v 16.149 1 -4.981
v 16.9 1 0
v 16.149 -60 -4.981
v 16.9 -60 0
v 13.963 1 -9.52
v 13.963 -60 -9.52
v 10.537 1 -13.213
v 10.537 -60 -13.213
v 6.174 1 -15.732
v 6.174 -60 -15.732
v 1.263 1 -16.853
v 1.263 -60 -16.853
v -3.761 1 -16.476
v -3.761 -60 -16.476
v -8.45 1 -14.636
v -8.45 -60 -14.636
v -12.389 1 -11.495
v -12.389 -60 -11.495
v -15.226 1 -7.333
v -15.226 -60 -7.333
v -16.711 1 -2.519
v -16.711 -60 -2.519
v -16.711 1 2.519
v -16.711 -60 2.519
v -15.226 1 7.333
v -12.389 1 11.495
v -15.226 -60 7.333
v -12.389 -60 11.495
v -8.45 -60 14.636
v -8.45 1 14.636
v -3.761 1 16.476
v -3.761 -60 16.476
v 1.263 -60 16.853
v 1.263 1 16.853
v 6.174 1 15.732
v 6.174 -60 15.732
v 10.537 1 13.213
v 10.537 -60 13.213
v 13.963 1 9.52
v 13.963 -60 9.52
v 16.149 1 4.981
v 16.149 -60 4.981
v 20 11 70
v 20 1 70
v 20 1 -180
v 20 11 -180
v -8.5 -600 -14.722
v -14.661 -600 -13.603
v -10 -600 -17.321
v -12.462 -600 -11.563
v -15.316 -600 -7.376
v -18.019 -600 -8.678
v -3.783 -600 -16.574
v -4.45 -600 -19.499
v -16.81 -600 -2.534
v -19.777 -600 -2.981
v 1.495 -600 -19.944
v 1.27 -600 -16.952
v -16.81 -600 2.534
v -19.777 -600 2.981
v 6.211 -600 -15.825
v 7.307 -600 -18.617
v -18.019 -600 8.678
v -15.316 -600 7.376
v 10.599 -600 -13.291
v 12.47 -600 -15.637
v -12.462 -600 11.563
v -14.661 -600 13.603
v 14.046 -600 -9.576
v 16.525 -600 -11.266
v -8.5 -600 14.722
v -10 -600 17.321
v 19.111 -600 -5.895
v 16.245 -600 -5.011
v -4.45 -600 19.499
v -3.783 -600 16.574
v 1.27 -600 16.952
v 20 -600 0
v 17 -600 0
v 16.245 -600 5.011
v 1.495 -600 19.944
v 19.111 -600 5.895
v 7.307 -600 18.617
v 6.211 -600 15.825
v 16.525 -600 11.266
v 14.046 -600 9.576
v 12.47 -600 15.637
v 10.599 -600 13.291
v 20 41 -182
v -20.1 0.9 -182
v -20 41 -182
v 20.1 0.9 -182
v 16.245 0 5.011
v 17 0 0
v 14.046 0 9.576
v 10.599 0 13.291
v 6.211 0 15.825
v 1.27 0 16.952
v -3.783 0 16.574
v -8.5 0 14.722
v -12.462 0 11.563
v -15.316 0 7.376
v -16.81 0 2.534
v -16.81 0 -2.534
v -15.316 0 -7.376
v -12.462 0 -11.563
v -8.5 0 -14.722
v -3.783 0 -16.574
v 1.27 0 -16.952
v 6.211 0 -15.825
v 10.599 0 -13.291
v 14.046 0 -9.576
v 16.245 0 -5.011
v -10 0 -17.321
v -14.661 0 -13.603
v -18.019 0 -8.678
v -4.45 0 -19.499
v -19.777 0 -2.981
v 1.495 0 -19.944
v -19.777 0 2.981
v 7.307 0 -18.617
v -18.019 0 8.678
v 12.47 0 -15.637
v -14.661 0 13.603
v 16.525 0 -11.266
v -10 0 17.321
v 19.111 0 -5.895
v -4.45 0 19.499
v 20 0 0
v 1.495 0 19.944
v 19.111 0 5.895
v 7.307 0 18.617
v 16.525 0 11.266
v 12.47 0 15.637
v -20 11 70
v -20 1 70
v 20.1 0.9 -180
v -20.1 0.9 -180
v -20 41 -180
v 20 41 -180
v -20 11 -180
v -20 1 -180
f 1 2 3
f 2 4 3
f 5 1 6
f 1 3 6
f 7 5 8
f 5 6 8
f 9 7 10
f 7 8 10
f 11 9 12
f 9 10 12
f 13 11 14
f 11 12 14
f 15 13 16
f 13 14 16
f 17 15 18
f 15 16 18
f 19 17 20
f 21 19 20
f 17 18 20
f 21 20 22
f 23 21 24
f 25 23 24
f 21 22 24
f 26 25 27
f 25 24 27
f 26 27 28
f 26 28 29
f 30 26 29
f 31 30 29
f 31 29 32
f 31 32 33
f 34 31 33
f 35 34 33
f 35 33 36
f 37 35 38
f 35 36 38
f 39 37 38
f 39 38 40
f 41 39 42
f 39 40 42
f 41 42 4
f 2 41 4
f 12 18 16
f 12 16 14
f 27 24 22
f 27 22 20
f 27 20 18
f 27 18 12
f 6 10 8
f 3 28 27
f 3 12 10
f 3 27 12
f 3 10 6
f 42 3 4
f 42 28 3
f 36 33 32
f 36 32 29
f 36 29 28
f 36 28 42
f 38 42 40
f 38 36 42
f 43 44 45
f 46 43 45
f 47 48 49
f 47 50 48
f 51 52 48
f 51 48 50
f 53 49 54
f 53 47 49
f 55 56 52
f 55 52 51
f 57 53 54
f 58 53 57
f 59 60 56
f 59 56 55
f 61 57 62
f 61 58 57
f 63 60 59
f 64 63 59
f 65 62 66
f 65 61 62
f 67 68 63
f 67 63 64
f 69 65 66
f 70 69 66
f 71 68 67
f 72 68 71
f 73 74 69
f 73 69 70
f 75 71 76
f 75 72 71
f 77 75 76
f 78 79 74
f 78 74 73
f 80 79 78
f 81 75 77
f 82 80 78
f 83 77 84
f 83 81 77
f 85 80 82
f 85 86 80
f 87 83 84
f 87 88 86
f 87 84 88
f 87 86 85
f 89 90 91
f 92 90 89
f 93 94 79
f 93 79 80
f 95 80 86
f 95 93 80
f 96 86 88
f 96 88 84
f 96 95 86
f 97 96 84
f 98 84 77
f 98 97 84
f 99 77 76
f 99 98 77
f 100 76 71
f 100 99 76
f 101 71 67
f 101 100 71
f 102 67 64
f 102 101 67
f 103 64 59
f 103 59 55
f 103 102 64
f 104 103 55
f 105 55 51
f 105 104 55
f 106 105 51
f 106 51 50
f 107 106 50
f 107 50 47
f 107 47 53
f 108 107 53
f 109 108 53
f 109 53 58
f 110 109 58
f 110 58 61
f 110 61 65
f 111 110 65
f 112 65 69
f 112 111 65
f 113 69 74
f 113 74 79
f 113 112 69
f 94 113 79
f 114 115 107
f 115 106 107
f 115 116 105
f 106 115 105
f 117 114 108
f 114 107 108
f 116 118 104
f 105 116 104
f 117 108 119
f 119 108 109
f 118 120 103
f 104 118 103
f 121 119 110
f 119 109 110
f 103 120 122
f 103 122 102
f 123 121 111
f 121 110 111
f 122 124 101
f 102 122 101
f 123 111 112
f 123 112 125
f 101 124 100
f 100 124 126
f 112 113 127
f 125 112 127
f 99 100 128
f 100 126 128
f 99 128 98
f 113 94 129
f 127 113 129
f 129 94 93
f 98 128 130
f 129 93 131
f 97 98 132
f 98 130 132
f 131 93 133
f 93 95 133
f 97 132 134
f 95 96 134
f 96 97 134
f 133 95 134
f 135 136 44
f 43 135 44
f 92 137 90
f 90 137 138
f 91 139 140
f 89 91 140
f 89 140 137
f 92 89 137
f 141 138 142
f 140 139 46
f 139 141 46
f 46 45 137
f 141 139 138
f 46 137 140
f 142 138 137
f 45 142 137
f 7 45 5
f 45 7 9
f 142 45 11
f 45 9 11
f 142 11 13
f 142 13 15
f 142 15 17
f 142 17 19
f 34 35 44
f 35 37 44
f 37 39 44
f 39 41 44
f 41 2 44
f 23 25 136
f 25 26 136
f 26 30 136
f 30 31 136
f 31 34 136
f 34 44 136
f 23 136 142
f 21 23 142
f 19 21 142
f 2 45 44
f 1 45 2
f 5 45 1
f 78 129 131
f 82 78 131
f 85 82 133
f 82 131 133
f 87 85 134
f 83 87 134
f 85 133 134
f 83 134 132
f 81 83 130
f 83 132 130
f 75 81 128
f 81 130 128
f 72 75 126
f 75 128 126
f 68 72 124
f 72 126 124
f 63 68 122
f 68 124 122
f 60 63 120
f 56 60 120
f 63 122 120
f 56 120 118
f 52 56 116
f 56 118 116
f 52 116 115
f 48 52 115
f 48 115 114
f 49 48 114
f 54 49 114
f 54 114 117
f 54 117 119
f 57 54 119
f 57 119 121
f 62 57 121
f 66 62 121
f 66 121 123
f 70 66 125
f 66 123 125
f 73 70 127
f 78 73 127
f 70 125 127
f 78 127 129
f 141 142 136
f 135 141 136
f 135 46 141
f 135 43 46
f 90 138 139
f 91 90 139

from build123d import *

# Parameters (mm, degrees)
F1_R      = 16.9
F2_DEPTH  = 60
F2_FACE_R = 16.9
F3_DEPTH  = 1
F5_DEPTH  = 10
F0_R      = 20
F0_R_2    = 17
F6_DEPTH  = 600
F8_DEPTH  = 2


with BuildPart() as f2:
    # F1 (on Front) → F2 (new body)
    with BuildSketch(Plane.XZ):
        Circle(F1_R)
    extrude(amount=F2_DEPTH)

    # F2_face (on face) → F3 (join)
    with BuildSketch(Plane(origin=(0, 0, 0), x_dir=(1, 0, 0), z_dir=(0, 1, 0))):
        Circle(F2_FACE_R)
    extrude(amount=F3_DEPTH)

    # F4 (on face) → F5 (join)
    with BuildSketch(Plane(origin=(0, 1, 0), x_dir=(-1, 0, 0), z_dir=(0, 1, 0))):
        Polygon((-20, 20), (-20, -180), (20, -180), (20, 20), (20, 70), (-20, 70), align=None)
    extrude(amount=F5_DEPTH)

    # F7 (on face) → F8 (join)
    with BuildSketch(Plane(origin=(0, 0, -180), x_dir=(1, 0, 0), z_dir=(0, 0, -1))):
        Polygon((-20.1, -0.900125), (-20, -41), (20, -41), (20.1, -0.900125), align=None)
    extrude(amount=F8_DEPTH)


with BuildPart() as f6:
    # F0 (on Front) → F6 (new body)
    with BuildSketch(Plane.XZ):
        Circle(F0_R)
        Circle(F0_R_2, mode=Mode.SUBTRACT)
    extrude(amount=F6_DEPTH)


solid = Compound([f2.part, f6.part])
